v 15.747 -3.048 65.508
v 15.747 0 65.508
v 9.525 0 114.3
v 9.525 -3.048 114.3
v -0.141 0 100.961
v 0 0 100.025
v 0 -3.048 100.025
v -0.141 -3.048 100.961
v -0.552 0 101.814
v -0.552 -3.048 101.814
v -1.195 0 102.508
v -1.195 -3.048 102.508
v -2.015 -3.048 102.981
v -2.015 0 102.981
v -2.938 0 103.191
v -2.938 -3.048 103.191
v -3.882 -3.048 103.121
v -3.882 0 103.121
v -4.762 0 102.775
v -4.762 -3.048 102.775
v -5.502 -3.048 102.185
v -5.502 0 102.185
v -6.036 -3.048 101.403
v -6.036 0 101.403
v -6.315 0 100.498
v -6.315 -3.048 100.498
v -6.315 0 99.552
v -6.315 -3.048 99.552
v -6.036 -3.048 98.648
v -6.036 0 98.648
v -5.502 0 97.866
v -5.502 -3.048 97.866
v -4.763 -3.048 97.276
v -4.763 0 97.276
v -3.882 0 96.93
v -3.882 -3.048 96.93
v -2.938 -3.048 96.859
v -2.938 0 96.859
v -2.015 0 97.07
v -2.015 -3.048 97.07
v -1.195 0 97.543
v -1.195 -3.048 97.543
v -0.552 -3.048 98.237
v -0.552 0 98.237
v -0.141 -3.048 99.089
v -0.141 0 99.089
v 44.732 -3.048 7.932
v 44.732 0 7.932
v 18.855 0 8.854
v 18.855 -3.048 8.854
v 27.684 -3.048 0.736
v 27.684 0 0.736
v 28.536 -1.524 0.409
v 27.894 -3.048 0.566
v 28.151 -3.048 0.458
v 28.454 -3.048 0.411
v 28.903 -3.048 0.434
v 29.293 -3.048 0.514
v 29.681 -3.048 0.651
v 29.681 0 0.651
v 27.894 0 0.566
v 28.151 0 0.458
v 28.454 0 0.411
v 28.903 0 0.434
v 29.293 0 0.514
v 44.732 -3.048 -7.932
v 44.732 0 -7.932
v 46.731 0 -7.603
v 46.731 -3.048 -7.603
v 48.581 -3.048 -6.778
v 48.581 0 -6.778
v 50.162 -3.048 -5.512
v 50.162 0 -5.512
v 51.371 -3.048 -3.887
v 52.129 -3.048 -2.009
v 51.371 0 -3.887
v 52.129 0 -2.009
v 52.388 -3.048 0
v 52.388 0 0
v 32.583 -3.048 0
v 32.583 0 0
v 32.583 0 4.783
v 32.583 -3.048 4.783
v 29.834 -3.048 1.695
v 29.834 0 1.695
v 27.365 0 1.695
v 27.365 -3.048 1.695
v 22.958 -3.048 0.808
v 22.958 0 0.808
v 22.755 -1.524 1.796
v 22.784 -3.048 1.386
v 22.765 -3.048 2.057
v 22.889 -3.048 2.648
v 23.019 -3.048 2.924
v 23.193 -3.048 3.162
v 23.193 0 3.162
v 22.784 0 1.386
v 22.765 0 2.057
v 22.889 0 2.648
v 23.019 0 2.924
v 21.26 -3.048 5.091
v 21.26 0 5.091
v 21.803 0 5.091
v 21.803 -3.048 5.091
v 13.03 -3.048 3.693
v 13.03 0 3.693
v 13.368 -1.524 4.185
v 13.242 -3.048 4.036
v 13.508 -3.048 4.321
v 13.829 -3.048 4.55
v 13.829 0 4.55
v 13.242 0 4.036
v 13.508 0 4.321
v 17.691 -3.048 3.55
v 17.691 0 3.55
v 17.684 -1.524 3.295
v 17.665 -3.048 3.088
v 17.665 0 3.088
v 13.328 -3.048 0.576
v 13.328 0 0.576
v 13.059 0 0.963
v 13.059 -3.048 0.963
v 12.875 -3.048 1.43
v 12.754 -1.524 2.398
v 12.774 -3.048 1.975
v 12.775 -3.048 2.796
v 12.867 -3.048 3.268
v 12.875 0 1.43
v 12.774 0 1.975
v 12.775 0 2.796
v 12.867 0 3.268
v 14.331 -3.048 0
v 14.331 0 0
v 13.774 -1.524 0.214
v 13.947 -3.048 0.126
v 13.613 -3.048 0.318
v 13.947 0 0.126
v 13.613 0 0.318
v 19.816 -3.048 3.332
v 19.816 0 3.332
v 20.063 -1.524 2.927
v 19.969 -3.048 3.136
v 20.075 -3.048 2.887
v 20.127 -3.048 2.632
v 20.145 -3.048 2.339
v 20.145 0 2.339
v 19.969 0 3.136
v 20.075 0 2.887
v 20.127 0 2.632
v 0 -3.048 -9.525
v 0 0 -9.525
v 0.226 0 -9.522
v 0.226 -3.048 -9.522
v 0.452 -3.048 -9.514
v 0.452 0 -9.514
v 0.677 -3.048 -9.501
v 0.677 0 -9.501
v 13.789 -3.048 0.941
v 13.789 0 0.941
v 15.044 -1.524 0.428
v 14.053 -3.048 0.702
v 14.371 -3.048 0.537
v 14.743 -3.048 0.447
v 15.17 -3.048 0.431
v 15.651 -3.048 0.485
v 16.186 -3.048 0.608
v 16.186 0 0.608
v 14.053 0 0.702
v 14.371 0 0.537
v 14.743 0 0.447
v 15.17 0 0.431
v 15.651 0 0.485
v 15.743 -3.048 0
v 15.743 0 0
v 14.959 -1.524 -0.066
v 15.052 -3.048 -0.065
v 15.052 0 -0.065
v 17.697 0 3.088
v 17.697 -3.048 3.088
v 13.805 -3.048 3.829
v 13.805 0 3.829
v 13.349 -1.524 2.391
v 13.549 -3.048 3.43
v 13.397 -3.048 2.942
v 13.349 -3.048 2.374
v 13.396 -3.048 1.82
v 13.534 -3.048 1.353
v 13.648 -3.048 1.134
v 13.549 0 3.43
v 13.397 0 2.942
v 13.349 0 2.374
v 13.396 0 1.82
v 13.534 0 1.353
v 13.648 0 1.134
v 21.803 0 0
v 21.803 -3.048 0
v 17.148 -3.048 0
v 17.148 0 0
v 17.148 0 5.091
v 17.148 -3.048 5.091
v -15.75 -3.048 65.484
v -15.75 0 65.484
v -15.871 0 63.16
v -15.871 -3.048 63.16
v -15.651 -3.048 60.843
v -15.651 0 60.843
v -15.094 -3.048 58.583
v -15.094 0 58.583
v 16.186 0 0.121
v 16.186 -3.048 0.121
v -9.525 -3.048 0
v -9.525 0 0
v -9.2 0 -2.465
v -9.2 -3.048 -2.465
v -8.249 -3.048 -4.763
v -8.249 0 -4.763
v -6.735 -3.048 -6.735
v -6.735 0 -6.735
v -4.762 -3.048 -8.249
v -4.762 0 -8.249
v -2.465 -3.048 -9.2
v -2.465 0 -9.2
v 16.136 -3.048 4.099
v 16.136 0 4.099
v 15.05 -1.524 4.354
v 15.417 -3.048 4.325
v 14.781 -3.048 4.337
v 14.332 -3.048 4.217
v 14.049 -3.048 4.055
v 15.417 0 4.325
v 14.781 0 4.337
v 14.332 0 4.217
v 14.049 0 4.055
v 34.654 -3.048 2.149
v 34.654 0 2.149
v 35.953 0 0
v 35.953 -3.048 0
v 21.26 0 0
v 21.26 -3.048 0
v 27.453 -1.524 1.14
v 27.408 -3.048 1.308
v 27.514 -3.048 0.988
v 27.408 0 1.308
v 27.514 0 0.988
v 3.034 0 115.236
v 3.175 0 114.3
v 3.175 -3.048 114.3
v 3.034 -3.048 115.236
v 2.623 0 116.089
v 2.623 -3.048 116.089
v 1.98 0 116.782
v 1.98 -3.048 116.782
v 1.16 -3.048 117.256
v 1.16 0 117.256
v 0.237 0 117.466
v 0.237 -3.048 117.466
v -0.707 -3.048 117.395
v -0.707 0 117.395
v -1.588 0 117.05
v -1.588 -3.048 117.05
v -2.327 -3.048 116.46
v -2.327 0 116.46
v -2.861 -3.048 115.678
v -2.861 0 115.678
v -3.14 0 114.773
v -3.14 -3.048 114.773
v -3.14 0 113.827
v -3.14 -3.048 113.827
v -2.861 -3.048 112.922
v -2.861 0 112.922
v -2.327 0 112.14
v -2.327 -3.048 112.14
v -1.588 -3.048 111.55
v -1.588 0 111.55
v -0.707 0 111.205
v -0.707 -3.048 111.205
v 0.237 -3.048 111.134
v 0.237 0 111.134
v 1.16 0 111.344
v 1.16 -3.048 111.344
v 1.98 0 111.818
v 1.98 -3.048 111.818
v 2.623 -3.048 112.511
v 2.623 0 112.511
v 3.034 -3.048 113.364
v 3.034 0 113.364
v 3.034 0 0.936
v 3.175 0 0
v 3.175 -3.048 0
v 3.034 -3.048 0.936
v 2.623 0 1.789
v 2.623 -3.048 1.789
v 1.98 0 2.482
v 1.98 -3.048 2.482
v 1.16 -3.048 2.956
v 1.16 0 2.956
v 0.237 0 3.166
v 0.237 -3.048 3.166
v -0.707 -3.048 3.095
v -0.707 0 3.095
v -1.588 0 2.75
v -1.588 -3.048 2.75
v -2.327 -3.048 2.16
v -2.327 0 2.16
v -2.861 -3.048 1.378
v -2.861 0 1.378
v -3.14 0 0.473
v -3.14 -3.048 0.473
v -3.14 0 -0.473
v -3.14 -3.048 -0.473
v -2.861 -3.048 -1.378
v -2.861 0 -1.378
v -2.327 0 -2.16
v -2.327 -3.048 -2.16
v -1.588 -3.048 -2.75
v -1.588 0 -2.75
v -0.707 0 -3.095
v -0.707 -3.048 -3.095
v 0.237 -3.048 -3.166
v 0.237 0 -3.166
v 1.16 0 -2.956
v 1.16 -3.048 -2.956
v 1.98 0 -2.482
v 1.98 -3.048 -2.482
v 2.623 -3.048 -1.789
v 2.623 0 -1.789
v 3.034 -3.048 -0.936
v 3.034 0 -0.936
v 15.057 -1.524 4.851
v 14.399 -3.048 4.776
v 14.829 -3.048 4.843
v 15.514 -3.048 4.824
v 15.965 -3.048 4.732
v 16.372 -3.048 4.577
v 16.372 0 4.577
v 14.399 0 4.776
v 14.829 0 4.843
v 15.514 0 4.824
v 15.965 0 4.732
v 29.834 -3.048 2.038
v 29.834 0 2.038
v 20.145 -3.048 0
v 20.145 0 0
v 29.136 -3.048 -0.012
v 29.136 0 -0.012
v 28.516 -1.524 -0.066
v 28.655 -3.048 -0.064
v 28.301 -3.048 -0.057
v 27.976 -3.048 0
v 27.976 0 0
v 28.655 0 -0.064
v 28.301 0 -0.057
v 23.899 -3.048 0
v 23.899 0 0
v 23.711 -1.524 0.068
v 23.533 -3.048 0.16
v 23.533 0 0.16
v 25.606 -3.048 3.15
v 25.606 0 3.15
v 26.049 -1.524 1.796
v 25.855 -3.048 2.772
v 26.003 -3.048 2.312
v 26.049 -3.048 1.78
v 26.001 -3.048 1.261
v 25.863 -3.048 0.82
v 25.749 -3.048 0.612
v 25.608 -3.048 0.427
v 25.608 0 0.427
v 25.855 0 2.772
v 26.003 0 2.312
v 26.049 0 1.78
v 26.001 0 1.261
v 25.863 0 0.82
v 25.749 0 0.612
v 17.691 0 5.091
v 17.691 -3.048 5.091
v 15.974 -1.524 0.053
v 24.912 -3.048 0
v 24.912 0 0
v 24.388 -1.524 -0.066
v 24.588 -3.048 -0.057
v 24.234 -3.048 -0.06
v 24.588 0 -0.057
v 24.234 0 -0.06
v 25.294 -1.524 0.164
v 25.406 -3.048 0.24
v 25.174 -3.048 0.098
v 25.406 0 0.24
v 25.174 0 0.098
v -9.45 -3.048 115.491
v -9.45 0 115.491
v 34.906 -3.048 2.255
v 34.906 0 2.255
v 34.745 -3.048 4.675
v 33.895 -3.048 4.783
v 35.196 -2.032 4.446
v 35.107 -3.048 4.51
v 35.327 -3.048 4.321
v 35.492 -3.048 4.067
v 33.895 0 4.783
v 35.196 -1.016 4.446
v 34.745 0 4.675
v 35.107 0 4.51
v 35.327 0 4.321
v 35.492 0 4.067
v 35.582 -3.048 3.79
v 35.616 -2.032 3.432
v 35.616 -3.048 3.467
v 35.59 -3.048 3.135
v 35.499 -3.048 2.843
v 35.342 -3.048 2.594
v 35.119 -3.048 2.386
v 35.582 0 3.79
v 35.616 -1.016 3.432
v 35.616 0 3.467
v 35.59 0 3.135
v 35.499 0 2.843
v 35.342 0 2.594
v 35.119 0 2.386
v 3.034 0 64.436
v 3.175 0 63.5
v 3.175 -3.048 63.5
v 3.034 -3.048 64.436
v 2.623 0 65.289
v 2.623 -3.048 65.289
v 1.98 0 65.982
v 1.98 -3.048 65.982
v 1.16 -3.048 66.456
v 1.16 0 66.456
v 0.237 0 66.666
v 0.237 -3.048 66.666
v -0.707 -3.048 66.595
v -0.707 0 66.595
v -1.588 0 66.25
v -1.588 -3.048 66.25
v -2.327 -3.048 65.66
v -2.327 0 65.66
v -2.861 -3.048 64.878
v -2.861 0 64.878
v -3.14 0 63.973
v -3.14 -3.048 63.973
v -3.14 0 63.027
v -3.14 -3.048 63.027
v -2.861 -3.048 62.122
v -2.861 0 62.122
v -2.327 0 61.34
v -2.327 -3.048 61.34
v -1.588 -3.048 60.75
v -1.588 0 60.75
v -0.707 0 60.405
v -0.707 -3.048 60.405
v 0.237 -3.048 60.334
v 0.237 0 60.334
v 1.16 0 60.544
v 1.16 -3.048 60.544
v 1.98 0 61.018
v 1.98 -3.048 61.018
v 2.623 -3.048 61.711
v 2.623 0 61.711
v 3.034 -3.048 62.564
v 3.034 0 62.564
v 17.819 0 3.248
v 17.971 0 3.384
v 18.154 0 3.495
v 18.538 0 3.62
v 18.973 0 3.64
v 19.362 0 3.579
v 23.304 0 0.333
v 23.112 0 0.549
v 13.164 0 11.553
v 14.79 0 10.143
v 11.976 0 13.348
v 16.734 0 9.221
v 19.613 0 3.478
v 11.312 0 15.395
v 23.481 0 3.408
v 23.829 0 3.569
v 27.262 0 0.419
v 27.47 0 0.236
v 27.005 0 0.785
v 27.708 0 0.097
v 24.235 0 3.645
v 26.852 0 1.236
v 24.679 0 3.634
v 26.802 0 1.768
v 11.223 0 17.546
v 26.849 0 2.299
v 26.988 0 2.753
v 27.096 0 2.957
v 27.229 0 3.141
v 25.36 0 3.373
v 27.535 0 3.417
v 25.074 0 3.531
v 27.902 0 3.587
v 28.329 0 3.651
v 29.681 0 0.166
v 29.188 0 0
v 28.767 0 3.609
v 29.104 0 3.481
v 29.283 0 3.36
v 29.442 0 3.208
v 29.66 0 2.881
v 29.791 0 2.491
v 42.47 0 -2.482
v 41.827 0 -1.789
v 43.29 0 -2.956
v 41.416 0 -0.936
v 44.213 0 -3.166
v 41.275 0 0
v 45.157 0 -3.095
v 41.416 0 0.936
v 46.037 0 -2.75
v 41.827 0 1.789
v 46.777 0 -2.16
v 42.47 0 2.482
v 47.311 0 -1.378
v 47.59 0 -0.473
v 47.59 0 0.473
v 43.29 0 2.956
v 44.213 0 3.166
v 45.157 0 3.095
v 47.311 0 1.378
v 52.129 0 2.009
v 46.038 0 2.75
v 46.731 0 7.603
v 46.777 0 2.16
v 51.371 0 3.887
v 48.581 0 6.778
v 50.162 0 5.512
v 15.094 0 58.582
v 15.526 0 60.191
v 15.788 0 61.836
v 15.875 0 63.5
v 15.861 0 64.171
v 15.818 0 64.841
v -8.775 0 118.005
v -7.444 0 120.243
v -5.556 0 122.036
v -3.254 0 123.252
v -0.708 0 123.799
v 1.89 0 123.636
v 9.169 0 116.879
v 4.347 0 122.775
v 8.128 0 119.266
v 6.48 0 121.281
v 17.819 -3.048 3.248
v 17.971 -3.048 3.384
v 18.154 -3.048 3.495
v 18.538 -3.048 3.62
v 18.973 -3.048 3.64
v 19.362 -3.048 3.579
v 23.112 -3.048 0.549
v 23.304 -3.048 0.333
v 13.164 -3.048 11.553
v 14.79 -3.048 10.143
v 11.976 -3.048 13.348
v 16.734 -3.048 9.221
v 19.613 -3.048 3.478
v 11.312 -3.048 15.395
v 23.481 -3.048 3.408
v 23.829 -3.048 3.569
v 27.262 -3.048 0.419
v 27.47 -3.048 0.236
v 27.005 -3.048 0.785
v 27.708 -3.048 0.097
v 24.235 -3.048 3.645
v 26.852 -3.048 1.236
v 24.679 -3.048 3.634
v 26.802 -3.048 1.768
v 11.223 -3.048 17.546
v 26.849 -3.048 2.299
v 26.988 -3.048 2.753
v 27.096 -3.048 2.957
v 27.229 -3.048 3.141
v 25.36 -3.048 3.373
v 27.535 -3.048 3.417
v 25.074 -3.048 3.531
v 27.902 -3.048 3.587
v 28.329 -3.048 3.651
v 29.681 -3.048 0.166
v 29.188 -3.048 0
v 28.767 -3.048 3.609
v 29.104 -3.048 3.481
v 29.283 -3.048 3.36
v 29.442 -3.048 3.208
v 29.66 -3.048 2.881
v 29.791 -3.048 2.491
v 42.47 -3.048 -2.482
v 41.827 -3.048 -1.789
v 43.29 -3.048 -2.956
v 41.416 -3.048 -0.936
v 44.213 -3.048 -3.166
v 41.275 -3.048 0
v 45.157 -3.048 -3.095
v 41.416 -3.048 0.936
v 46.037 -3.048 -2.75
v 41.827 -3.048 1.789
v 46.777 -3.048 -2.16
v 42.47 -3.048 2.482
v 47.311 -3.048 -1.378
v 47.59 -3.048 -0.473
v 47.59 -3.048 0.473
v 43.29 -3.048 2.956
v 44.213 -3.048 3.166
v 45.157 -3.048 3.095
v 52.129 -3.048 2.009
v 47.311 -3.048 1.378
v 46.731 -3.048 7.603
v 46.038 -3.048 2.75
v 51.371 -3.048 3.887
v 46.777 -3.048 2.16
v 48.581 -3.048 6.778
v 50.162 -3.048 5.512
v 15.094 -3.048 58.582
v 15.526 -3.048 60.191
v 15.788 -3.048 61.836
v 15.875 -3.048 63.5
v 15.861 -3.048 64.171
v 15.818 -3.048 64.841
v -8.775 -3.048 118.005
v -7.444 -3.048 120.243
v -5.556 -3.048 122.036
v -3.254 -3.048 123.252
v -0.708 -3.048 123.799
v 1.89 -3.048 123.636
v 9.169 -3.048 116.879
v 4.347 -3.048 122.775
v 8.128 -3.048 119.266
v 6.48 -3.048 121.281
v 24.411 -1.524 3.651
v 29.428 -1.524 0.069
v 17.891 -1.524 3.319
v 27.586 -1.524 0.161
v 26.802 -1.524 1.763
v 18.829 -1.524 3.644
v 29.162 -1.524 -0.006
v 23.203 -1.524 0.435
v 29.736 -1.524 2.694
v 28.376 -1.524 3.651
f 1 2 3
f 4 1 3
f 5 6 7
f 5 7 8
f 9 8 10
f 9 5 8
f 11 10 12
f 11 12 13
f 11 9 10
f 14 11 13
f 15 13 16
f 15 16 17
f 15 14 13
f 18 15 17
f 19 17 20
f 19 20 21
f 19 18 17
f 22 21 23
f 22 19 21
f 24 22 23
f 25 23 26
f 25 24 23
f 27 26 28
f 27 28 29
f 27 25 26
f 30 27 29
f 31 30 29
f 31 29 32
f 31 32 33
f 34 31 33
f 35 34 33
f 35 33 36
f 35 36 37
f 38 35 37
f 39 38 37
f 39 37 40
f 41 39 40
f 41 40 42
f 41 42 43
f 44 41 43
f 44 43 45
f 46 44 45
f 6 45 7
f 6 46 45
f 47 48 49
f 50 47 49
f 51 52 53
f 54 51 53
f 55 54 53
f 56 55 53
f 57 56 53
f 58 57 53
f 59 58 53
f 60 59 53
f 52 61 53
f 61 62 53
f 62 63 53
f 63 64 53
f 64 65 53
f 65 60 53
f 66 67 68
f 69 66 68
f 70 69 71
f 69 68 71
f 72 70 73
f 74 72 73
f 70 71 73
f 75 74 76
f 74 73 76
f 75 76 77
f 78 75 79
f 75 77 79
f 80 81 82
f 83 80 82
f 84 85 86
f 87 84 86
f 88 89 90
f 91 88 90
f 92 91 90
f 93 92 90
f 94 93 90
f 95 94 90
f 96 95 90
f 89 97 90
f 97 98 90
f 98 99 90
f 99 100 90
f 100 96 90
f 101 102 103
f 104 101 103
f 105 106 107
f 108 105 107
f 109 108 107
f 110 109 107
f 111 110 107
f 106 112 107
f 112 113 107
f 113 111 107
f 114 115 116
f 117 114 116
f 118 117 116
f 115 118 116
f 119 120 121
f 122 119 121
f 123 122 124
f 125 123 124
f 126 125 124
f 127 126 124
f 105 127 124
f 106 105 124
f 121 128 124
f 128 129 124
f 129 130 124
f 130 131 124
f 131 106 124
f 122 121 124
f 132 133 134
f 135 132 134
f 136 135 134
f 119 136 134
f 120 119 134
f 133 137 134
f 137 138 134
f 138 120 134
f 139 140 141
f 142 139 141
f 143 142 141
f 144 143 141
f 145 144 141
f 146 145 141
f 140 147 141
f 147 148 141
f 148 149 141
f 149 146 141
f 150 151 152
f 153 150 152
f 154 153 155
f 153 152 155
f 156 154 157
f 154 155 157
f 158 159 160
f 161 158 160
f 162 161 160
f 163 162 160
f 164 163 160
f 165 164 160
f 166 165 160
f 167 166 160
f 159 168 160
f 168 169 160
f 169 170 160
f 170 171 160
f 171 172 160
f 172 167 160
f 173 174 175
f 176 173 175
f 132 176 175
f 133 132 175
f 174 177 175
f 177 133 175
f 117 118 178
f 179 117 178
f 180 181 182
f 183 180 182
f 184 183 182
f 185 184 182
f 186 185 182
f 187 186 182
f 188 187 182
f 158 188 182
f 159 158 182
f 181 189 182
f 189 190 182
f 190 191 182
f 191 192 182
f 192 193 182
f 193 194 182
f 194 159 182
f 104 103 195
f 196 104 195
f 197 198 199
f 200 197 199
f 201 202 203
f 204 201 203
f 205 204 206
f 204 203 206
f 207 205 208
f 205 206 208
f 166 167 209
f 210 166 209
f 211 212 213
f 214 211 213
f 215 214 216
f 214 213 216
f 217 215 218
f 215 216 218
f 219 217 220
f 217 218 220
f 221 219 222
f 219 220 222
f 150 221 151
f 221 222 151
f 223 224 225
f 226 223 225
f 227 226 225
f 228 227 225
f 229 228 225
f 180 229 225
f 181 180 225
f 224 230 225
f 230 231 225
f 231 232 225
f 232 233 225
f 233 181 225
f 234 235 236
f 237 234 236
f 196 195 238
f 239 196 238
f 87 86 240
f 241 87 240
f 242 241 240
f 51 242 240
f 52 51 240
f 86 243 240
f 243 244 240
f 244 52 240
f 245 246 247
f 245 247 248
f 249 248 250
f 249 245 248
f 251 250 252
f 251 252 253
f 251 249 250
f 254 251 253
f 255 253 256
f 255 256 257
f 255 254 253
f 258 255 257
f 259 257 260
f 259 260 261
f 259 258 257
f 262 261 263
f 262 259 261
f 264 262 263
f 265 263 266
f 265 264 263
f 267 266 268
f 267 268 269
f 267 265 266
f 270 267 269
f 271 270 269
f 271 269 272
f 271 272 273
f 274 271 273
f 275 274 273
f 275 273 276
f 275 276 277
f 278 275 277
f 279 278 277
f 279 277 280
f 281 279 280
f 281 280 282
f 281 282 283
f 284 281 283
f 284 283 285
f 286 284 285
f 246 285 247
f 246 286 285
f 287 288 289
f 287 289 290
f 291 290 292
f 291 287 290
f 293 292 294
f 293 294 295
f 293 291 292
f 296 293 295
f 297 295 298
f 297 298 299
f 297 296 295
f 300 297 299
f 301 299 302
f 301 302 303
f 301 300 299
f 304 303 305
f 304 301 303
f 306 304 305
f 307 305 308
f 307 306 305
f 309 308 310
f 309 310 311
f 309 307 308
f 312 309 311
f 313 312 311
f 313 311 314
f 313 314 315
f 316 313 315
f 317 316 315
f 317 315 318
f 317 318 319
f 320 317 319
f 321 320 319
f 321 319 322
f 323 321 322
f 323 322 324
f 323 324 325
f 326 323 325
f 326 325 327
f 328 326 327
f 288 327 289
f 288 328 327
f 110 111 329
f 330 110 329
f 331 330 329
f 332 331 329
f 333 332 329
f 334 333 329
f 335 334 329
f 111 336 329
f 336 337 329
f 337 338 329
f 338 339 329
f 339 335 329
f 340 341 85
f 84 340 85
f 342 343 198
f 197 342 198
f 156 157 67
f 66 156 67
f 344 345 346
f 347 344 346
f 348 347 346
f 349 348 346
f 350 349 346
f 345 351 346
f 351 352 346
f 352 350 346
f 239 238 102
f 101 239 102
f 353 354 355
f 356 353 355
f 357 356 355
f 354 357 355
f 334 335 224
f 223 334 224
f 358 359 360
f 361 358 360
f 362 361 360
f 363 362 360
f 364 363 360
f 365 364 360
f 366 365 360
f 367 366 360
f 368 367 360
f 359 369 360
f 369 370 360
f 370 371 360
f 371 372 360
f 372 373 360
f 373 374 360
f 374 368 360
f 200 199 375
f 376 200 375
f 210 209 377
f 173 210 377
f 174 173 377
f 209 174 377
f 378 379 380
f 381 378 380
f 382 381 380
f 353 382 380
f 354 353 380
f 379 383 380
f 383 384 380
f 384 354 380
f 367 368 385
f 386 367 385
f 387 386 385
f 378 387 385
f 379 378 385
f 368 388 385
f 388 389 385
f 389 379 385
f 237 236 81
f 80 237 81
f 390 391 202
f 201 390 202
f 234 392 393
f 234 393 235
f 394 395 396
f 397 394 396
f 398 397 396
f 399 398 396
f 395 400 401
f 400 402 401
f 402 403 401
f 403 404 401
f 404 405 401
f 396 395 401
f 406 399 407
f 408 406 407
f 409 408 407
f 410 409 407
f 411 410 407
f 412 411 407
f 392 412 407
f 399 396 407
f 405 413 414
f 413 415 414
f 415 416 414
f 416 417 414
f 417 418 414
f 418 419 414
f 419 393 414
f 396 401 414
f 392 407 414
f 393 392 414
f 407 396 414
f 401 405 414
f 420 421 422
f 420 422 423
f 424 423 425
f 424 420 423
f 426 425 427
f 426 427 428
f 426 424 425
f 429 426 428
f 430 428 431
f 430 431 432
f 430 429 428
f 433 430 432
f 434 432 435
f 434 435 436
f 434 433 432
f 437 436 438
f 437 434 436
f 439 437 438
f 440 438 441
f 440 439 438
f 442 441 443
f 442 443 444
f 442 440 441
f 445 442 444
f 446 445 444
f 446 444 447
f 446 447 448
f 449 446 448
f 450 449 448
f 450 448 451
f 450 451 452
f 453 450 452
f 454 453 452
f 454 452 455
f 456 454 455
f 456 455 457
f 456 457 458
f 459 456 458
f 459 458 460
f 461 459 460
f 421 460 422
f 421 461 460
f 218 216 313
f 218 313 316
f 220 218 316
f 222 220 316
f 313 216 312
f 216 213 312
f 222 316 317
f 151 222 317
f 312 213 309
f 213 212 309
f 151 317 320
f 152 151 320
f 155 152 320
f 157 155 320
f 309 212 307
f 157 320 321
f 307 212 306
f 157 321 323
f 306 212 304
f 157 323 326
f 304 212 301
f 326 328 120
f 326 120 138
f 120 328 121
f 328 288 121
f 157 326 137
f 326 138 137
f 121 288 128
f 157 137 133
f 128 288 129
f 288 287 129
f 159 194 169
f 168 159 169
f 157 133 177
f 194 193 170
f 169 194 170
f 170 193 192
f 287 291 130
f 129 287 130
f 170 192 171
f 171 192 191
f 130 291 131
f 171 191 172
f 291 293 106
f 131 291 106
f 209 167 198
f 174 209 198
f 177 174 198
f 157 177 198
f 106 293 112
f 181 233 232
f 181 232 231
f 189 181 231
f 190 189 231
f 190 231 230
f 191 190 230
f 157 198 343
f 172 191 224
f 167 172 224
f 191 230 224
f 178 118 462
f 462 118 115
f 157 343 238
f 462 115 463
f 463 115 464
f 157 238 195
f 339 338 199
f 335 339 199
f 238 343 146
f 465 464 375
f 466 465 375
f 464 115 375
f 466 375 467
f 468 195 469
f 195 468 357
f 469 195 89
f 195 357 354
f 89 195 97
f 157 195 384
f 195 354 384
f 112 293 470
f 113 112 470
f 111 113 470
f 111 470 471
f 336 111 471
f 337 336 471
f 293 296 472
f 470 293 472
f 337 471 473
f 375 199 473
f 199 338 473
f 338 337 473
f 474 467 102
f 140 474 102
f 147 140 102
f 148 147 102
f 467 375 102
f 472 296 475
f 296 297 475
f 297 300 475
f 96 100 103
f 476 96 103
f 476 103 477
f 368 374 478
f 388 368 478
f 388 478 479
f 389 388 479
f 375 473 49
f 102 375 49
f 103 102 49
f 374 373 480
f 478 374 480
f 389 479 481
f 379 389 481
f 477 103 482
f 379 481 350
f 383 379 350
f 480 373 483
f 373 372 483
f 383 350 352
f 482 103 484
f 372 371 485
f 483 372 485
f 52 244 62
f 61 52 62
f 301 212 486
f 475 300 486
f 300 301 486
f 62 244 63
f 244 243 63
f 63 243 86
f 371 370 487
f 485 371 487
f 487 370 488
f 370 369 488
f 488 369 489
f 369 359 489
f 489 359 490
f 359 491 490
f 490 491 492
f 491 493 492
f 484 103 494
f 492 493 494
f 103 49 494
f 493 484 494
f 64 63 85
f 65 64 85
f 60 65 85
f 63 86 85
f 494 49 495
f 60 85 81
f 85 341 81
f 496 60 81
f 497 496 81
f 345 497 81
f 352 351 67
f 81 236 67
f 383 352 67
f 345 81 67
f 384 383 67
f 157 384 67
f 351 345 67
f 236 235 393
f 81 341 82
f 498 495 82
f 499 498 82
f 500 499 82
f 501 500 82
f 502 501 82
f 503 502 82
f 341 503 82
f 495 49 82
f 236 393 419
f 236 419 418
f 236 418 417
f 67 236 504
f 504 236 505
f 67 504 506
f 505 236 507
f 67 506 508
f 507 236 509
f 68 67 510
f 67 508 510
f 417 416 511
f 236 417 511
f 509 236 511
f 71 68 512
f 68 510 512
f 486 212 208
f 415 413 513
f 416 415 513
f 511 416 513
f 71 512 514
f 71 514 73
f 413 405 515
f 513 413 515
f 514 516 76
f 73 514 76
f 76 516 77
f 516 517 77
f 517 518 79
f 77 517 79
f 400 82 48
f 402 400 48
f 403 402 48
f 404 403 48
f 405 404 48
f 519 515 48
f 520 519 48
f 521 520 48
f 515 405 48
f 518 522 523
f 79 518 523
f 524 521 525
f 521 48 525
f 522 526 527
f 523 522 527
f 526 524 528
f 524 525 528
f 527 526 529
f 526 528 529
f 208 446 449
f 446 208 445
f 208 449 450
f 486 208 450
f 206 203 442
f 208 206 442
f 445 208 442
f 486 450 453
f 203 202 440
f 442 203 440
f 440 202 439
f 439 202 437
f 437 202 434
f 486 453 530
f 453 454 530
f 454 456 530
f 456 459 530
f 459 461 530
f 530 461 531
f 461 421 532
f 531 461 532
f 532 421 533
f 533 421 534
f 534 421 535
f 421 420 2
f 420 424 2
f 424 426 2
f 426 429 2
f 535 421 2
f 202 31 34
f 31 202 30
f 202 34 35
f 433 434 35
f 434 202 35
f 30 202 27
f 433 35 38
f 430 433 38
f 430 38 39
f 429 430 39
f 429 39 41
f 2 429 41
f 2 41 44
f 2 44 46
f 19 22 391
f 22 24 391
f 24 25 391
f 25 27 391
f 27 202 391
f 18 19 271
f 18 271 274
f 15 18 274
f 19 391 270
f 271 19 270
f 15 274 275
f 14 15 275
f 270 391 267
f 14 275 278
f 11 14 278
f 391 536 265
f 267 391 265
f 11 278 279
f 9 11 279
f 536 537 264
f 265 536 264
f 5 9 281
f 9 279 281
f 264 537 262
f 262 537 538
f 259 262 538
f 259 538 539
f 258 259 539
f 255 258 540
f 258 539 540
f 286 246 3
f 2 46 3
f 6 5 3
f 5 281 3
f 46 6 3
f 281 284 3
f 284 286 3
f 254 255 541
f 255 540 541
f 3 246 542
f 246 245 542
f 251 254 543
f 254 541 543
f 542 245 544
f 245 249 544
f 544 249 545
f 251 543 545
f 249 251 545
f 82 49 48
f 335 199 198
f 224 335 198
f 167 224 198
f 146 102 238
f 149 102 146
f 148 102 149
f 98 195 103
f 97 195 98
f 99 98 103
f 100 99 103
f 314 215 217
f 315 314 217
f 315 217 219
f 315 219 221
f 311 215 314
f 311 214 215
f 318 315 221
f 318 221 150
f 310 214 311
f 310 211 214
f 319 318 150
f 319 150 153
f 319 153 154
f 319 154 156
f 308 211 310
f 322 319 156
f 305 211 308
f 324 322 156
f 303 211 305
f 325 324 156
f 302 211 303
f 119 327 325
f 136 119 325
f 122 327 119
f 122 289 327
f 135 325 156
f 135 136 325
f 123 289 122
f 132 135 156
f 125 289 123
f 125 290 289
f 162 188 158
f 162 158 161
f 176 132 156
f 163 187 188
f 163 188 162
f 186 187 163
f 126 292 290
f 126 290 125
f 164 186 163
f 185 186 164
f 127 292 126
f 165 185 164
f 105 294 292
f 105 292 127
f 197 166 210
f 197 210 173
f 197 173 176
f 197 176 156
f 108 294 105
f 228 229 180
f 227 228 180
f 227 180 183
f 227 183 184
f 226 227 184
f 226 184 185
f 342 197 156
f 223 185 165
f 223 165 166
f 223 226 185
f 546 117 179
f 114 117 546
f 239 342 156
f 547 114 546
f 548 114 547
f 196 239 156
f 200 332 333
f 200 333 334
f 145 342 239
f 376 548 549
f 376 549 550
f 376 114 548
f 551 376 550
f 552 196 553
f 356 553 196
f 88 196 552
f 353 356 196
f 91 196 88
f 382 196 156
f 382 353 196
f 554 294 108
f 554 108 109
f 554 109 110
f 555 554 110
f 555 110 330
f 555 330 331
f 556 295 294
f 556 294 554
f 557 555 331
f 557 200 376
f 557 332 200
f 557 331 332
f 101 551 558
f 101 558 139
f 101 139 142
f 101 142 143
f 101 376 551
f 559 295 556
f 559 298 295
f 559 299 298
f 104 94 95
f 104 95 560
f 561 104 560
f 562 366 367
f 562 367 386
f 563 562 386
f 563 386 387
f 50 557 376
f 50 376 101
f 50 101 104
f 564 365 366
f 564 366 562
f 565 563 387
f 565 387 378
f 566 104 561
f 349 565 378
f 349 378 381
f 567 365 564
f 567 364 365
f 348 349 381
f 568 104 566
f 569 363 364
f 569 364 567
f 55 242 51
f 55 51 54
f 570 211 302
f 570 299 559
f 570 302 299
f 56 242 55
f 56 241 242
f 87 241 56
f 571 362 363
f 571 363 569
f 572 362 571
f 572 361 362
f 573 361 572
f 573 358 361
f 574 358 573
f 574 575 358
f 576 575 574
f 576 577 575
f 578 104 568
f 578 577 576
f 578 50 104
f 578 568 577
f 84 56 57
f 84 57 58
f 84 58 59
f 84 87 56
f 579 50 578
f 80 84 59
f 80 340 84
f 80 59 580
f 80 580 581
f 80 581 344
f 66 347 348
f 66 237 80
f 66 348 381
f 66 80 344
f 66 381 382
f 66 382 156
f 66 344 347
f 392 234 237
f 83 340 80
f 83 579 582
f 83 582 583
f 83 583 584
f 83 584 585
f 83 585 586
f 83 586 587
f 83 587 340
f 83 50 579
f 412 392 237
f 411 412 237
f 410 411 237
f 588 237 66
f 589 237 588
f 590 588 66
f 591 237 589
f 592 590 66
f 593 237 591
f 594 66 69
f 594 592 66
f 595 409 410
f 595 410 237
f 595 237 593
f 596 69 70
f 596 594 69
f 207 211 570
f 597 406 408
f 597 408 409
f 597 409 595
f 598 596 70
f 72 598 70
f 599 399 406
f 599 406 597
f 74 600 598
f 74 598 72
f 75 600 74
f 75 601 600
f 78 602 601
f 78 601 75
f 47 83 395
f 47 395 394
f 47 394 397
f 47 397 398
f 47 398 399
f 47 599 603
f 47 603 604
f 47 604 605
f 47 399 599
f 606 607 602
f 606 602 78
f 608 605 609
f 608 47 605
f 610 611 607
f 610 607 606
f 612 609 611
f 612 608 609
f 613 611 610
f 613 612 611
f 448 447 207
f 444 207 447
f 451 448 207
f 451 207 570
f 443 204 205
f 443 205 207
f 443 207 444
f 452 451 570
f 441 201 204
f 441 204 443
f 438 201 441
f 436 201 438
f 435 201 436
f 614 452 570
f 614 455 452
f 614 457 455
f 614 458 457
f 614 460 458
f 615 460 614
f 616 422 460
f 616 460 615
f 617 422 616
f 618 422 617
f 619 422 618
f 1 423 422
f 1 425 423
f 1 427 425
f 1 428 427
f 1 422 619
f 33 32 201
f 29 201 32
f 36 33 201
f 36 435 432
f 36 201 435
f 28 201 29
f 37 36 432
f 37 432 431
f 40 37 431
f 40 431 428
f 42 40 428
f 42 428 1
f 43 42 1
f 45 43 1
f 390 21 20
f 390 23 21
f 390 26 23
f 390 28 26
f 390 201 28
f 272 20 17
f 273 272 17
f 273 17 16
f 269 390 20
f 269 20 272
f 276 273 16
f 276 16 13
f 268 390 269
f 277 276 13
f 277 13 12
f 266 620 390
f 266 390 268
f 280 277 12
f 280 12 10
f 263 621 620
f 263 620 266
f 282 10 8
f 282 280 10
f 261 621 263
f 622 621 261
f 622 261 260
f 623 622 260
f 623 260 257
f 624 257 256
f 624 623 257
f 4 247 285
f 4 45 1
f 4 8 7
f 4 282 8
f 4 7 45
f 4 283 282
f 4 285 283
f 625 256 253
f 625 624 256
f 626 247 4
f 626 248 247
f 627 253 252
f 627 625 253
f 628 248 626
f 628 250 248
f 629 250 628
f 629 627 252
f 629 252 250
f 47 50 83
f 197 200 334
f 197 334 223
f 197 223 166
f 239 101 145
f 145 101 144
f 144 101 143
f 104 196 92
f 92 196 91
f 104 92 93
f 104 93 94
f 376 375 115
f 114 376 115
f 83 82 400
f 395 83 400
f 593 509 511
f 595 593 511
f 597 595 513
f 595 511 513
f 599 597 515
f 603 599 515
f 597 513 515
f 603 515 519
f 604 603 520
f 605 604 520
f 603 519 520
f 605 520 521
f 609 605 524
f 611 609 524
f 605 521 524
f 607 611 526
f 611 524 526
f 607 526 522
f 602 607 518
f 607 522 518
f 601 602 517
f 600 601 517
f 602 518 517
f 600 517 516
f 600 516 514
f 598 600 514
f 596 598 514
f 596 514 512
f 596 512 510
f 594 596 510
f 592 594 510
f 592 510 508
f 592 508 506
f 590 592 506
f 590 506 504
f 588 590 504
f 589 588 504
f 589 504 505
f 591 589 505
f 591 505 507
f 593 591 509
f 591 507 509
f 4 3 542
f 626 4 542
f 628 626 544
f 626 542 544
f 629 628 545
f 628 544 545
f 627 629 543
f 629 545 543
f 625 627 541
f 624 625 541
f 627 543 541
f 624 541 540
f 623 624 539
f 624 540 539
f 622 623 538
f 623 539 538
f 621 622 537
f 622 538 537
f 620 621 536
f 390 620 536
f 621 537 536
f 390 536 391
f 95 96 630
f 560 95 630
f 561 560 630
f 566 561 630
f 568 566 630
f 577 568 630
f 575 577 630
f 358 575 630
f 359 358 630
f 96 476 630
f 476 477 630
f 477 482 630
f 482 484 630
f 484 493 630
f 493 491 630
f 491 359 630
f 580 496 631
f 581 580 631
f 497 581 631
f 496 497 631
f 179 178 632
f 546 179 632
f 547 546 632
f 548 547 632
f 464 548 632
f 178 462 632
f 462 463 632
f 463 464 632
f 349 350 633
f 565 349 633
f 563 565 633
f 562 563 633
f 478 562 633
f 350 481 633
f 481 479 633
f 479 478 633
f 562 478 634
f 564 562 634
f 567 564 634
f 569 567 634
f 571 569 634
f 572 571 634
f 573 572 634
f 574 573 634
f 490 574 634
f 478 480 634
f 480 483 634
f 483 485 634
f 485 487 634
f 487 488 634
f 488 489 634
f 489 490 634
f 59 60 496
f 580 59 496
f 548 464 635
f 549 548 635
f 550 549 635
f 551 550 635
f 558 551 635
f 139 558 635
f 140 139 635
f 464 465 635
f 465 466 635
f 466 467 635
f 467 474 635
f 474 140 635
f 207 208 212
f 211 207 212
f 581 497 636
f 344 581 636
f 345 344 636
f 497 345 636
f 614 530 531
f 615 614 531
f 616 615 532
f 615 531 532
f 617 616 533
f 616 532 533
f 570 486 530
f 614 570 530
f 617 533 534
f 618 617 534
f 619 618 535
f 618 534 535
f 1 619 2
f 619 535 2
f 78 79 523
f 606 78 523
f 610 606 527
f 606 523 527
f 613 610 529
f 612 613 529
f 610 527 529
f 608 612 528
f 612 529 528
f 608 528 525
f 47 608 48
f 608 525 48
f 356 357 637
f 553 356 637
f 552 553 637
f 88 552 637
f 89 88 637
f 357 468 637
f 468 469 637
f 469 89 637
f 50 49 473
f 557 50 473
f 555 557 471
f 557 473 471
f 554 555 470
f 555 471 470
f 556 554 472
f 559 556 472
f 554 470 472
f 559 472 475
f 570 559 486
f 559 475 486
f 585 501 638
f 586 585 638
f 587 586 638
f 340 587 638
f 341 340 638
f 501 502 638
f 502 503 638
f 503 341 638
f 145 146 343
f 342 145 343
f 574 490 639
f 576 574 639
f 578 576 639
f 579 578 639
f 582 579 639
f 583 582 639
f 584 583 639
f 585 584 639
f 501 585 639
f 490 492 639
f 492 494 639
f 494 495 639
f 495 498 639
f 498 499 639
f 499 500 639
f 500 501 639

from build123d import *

# Parameters (mm, degrees)
F0_R     = 3.175
F1_DEPTH = 3.048


with BuildPart() as f1:
    # F0 (on Front) → F1 (new body)
    with BuildSketch(Plane.XZ):
        with BuildLine():
            ThreePointArc((0.6773435479, -9.500885786), (6.9705567315, -6.4912990883), (9.525, 0))
            ThreePointArc((9.525, 0), (0, 9.525), (-9.525, 0))
            ThreePointArc((-9.525, 0), (-6.7351920908, -6.7351920908), (0, -9.525))
            Line((0, -9.525), (0.6773435479, -9.500885786))
        make_face()
        Circle(F0_R, mode=Mode.SUBTRACT)
        with BuildLine():
            ThreePointArc((-9.525, 0), (0, 9.525), (9.525, 0))
            Line((9.525, 0), (14.331017163, 0))
            add(Edge.make_bspline(
                [(14.331017163, 0), (13.7183681716, 0.1397724716), (13.3282485764, 0.5757675707)],
                knots=[0.3205826669, 0.3205826669, 0.3205826669, 1, 1, 1], degree=2))
            add(Edge.make_bspline(
                [(13.3282485764, 0.5757675707), (12.7540512809, 1.2174866995), (12.7540512809, 2.3983336445)],
                knots=[0, 0, 0, 1, 1, 1], degree=2))
            add(Edge.make_bspline(
                [(12.7540512809, 2.3983336445), (12.7540512809, 3.1374098353), (13.0304197148, 3.6932872536)],
                knots=[0, 0, 0, 1, 1, 1], degree=2))
            add(Edge.make_bspline(
                [(13.0304197148, 3.6932872536), (13.3067881487, 4.2491646718), (13.8286429378, 4.5501340838)],
                knots=[0, 0, 0, 1, 1, 1], degree=2))
            add(Edge.make_bspline(
                [(13.8286429378, 4.5501340838), (14.3504977269, 4.8511034957), (15.0571215637, 4.8511034957)],
                knots=[0, 0, 0, 1, 1, 1], degree=2))
            add(Edge.make_bspline(
                [(15.0571215637, 4.8511034957), (15.808759956, 4.8511034957), (16.3719653252, 4.5768287621)],
                knots=[0, 0, 0, 1, 1, 1], degree=2))
            Line((16.3719653252, 4.5768287621), (16.1364240462, 4.0994651034))
            add(Edge.make_bspline(
                [(16.1364240462, 4.0994651034), (15.5931088295, 4.3538496847), (15.0497936128, 4.3538496847)],
                knots=[0, 0, 0, 1, 1, 1], degree=2))
            add(Edge.make_bspline(
                [(15.0497936128, 4.3538496847), (14.261515466, 4.3538496847), (13.8050888099, 3.8288543452)],
                knots=[0, 0, 0, 1, 1, 1], degree=2))
            add(Edge.make_bspline(
                [(13.8050888099, 3.8288543452), (13.3486621539, 3.3038590057), (13.3486621539, 2.3910056936)],
                knots=[0, 0, 0, 1, 1, 1], degree=2))
            add(Edge.make_bspline(
                [(13.3486621539, 2.3910056936), (13.3486621539, 1.4530279784), (13.7888626329, 0.9405948405)],
                knots=[0, 0, 0, 1, 1, 1], degree=2))
            add(Edge.make_bspline(
                [(13.7888626329, 0.9405948405), (14.229063112, 0.4281617026), (15.043512512, 0.4281617026)],
                knots=[0, 0, 0, 1, 1, 1], degree=2))
            add(Edge.make_bspline(
                [(15.043512512, 0.4281617026), (15.5439068735, 0.4281617026), (16.1856260023, 0.6082199247)],
                knots=[0, 0, 0, 1, 1, 1], degree=2))
            Line((16.1856260023, 0.6082199247), (16.1856260023, 0.1214346149))
            add(Edge.make_bspline(
                [(16.1856260023, 0.1214346149), (15.9833720986, 0.045216828), (15.7426700783, 0)],
                knots=[0, 0, 0, 0.406741787, 0.406741787, 0.406741787], degree=2))
            Line((15.7426700783, 0), (17.1476812704, 0))
            Line((17.1476812704, 0), (17.1476812704, 5.0908321752))
            Line((17.1476812704, 5.0908321752), (17.6909964871, 5.0908321752))
            Line((17.6909964871, 5.0908321752), (17.6909964871, 3.5498687859))
            add(Edge.make_bspline(
                [(17.6909964871, 3.5498687859), (17.6909964871, 3.2714066517), (17.6648252339, 3.0882078792)],
                knots=[0, 0, 0, 1, 1, 1], degree=2))
            Line((17.6648252339, 3.0882078792), (17.6972775879, 3.0882078792))
            add(Edge.make_bspline(
                [(17.6972775879, 3.0882078792), (17.8574456576, 3.346779861), (18.153704244, 3.4954325793)],
                knots=[0, 0, 0, 1, 1, 1], degree=2))
            add(Edge.make_bspline(
                [(18.153704244, 3.4954325793), (18.4499628303, 3.6440852975), (18.8289225769, 3.6440852975)],
                knots=[0, 0, 0, 1, 1, 1], degree=2))
            add(Edge.make_bspline(
                [(18.8289225769, 3.6440852975), (19.4863444576, 3.6440852975), (19.8155788231, 3.3316005341)],
                knots=[0, 0, 0, 1, 1, 1], degree=2))
            add(Edge.make_bspline(
                [(19.8155788231, 3.3316005341), (20.1448131885, 3.0191157708), (20.1448131885, 2.3386631872)],
                knots=[0, 0, 0, 1, 1, 1], degree=2))
            Line((20.1448131885, 2.3386631872), (20.1448131885, 0))
            Line((20.1448131885, 0), (21.2597085754, 0))
            Line((21.2597085754, 0), (21.2597085754, 5.0908321752))
            Line((21.2597085754, 5.0908321752), (21.8030237921, 5.0908321752))
            Line((21.8030237921, 5.0908321752), (21.8030237921, 0))
            Line((21.8030237921, 0), (23.8993166222, 0))
            add(Edge.make_bspline(
                [(23.8993166222, 0), (23.7048762281, 0.0561669981), (23.5334670546, 0.1601680697)],
                knots=[0.5400617249, 0.5400617249, 0.5400617249, 1, 1, 1], degree=2))
            add(Edge.make_bspline(
                [(23.5334670546, 0.1601680697), (23.1607884089, 0.3862876974), (22.9576994839, 0.8081682992)],
                knots=[0, 0, 0, 1, 1, 1], degree=2))
            add(Edge.make_bspline(
                [(22.9576994839, 0.8081682992), (22.754610559, 1.2300489011), (22.754610559, 1.7963948206)],
                knots=[0, 0, 0, 1, 1, 1], degree=2))
            add(Edge.make_bspline(
                [(22.754610559, 1.7963948206), (22.754610559, 2.6726083782), (23.1932407628, 3.1620108133)],
                knots=[0, 0, 0, 1, 1, 1], degree=2))
            add(Edge.make_bspline(
                [(23.1932407628, 3.1620108133), (23.6318709667, 3.6514132484), (24.4107274624, 3.6514132484)],
                knots=[0, 0, 0, 1, 1, 1], degree=2))
            add(Edge.make_bspline(
                [(24.4107274624, 3.6514132484), (25.1623658547, 3.6514132484), (25.6057068841, 3.1504954619)],
                knots=[0, 0, 0, 1, 1, 1], degree=2))
            add(Edge.make_bspline(
                [(25.6057068841, 3.1504954619), (26.0490479136, 2.6495776754), (26.0490479136, 1.7963948206)],
                knots=[0, 0, 0, 1, 1, 1], degree=2))
            add(Edge.make_bspline(
                [(26.0490479136, 1.7963948206), (26.0490479136, 0.9191344129), (25.6078005844, 0.4265914274)],
                knots=[0, 0, 0, 1, 1, 1], degree=2))
            add(Edge.make_bspline(
                [(25.6078005844, 0.4265914274), (25.3280160816, 0.1142815613), (24.9124948555, 0)],
                knots=[0, 0, 0, 0.6340763655, 0.6340763655, 0.6340763655], degree=2))
            Line((24.9124948555, 0), (27.9757976787, 0))
            add(Edge.make_bspline(
                [(27.9757976787, 0), (27.5521982697, 0.1128392886), (27.2618237875, 0.4187400514)],
                knots=[0.3688754729, 0.3688754729, 0.3688754729, 1, 1, 1], degree=2))
            add(Edge.make_bspline(
                [(27.2618237875, 0.4187400514), (26.801733156, 0.9034316609), (26.801733156, 1.7628956165)],
                knots=[0, 0, 0, 1, 1, 1], degree=2))
            add(Edge.make_bspline(
                [(26.801733156, 1.7628956165), (26.801733156, 2.6307343731), (27.2288480084, 3.1410738107)],
                knots=[0, 0, 0, 1, 1, 1], degree=2))
            add(Edge.make_bspline(
                [(27.2288480084, 3.1410738107), (27.6559628609, 3.6514132484), (28.3761957493, 3.6514132484)],
                knots=[0, 0, 0, 1, 1, 1], degree=2))
            add(Edge.make_bspline(
                [(28.3761957493, 3.6514132484), (29.049320382, 3.6514132484), (29.4418891802, 3.208072219)],
                knots=[0, 0, 0, 1, 1, 1], degree=2))
            add(Edge.make_bspline(
                [(29.4418891802, 3.208072219), (29.8344579784, 2.7647311895), (29.8344579784, 2.0382172003)],
                knots=[0, 0, 0, 1, 1, 1], degree=2))
            Line((29.8344579784, 2.0382172003), (29.8344579784, 1.6948503581))
            Line((29.8344579784, 1.6948503581), (27.3649385251, 1.6948503581))
            add(Edge.make_bspline(
                [(27.3649385251, 1.6948503581), (27.3816881272, 1.0635997306), (27.6842278144, 0.7364590654)],
                knots=[0, 0, 0, 1, 1, 1], degree=2))
            add(Edge.make_bspline(
                [(27.6842278144, 0.7364590654), (27.9867675015, 0.4093184003), (28.536363819, 0.4093184003)],
                knots=[0, 0, 0, 1, 1, 1], degree=2))
            add(Edge.make_bspline(
                [(28.536363819, 0.4093184003), (29.1152719401, 0.4093184003), (29.6805710095, 0.65114078)],
                knots=[0, 0, 0, 1, 1, 1], degree=2))
            Line((29.6805710095, 0.65114078), (29.6805710095, 0.1664491704))
            add(Edge.make_bspline(
                [(29.6805710095, 0.1664491704), (29.4213281794, 0.0552104288), (29.1875527642, 0)],
                knots=[0, 0, 0, 0.9005120931, 0.9005120931, 0.9005120931], degree=2))
            Line((29.1875527642, 0), (32.583486416, 0))
            Line((32.583486416, 0), (32.583486416, 4.7830582374))
            Line((32.583486416, 4.7830582374), (33.8951896271, 4.7830582374))
            add(Edge.make_bspline(
                [(33.8951896271, 4.7830582374), (34.7755905852, 4.7830582374), (35.1959009118, 4.445972496)],
                knots=[0, 0, 0, 1, 1, 1], degree=2))
            add(Edge.make_bspline(
                [(35.1959009118, 4.445972496), (35.6162112384, 4.1088867546), (35.6162112384, 3.4315747214)],
                knots=[0, 0, 0, 1, 1, 1], degree=2))
            add(Edge.make_bspline(
                [(35.6162112384, 3.4315747214), (35.6162112384, 2.4831285049), (34.6541559703, 2.1491833139)],
                knots=[0, 0, 0, 1, 1, 1], degree=2))
            Line((34.6541559703, 2.1491833139), (35.9532969798, 0))
            Line((35.9532969798, 0), (36.5125, 0))
            ThreePointArc((36.5125, 0), (38.9380895153, 5.7116327839), (44.7324052746, 7.9324746146))
            Line((44.7324052746, 7.9324746146), (18.854776384, 8.8537481448))
            ThreePointArc((18.854776384, 8.8537481448), (13.1636347791, 11.5532480081), (11.2225788762, 17.545634366))
            Line((11.2225788762, 17.545634366), (15.0940259351, 58.5820729906))
            ThreePointArc((15.0940259351, 58.5820729906), (-0.0006204693, 47.6250000121), (-15.0944103202, 58.583252896))
            Line((-15.0944103202, 58.583252896), (-9.525, 0))
        make_face()
        with BuildLine():
            Line((14.331017163, 0), (9.525, 0))
            ThreePointArc((9.525, 0), (6.9705567315, -6.4912990883), (0.6773435479, -9.500885786))
            Line((0.6773435479, -9.500885786), (44.7324052746, -7.9324746146))
            ThreePointArc((44.7324052746, -7.9324746146), (38.9380895153, -5.7116327839), (36.5125, 0))
            Line((36.5125, 0), (35.9532969798, 0))
            Line((35.9532969798, 0), (35.2958750991, 0))
            Line((35.2958750991, 0), (33.1393638343, 0))
            Line((33.1393638343, 0), (32.583486416, 0))
            Line((32.583486416, 0), (29.1875527642, 0))
            add(Edge.make_bspline(
                [(29.1875527642, 0), (29.1617254301, -0.0060996071), (29.1362089427, -0.0115153514)],
                knots=[0.9005120931, 0.9005120931, 0.9005120931, 1, 1, 1], degree=2))
            add(Edge.make_bspline(
                [(29.1362089427, -0.0115153514), (28.8797306612, -0.0659515581), (28.5164736666, -0.0659515581)],
                knots=[0, 0, 0, 1, 1, 1], degree=2))
            add(Edge.make_bspline(
                [(28.5164736666, -0.0659515581), (28.2233802484, -0.0659515581), (27.9757976787, 0)],
                knots=[0, 0, 0, 0.3688754729, 0.3688754729, 0.3688754729], degree=2))
            Line((27.9757976787, 0), (24.9124948555, 0))
            add(Edge.make_bspline(
                [(24.9124948555, 0), (24.6726987592, -0.0659515581), (24.3876967595, -0.0659515581)],
                knots=[0.6340763655, 0.6340763655, 0.6340763655, 1, 1, 1], degree=2))
            add(Edge.make_bspline(
                [(24.3876967595, -0.0659515581), (24.1276294639, -0.0659515581), (23.8993166222, 0)],
                knots=[0, 0, 0, 0.5400617249, 0.5400617249, 0.5400617249], degree=2))
            Line((23.8993166222, 0), (21.8030237921, 0))
            Line((21.8030237921, 0), (21.2597085754, 0))
            Line((21.2597085754, 0), (20.1448131885, 0))
            Line((20.1448131885, 0), (19.6014979718, 0))
            Line((19.6014979718, 0), (17.6909964871, 0))
            Line((17.6909964871, 0), (17.1476812704, 0))
            Line((17.1476812704, 0), (15.7426700783, 0))
            add(Edge.make_bspline(
                [(15.7426700783, 0), (15.3915911999, -0.0659515581), (14.9587176516, -0.0659515581)],
                knots=[0.406741787, 0.406741787, 0.406741787, 1, 1, 1], degree=2))
            add(Edge.make_bspline(
                [(14.9587176516, -0.0659515581), (14.6200952275, -0.0659515581), (14.331017163, 0)],
                knots=[0, 0, 0, 0.3205826669, 0.3205826669, 0.3205826669], degree=2))
        make_face()
        with BuildLine():
            ThreePointArc((0, -9.525), (0.3388863295, -9.5189695375), (0.6773435479, -9.500885786))
            Line((0.6773435479, -9.500885786), (0, -9.525))
        make_face()
        with BuildLine():
            Line((-15.7504882737, 65.484375), (-15.0944103202, 58.583252896))
            ThreePointArc((-15.0944103202, 58.583252896), (-0.0006204693, 47.6250000121), (15.0940259351, 58.5820729906))
            Line((15.0940259351, 58.5820729906), (15.7474569047, 65.5082893304))
            ThreePointArc((15.7474569047, 65.5082893304), (-0.0120528461, 79.3749954245), (-15.7504882737, 65.484375))
        make_face()
        with Locations((0, 63.5)):
            Circle(F0_R, mode=Mode.SUBTRACT)
        with BuildLine():
            ThreePointArc((-15.7504882737, 65.484375), (-15.8037436669, 61.9975649401), (-15.0944103202, 58.583252896))
            Line((-15.0944103202, 58.583252896), (-15.7504882737, 65.484375))
        make_face()
        with BuildLine():
            ThreePointArc((36.5125, 0), (38.9380895153, -5.7116327839), (44.7324052746, -7.9324746146))
            ThreePointArc((44.7324052746, -7.9324746146), (50.1616327839, -5.5119104847), (52.3875, 0))
            ThreePointArc((52.3875, 0), (50.1616327839, 5.5119104847), (44.7324052746, 7.9324746146))
            ThreePointArc((44.7324052746, 7.9324746146), (38.9380895153, 5.7116327839), (36.5125, 0))
        make_face()
        with BuildLine():
            ThreePointArc((47.625, 0), (44.45, -3.175), (41.275, 0))
            ThreePointArc((41.275, 0), (44.45, 3.175), (47.625, 0))
        make_face(mode=Mode.SUBTRACT)
        with BuildLine():
            Line((-9.4502929642, 115.490625), (-15.7504882737, 65.484375))
            ThreePointArc((-15.7504882737, 65.484375), (-0.0120528461, 79.3749954245), (15.7474569047, 65.5082893304))
            Line((15.7474569047, 65.5082893304), (9.525, 114.3))
            ThreePointArc((9.525, 114.3), (-0.596483242, 104.7936951058), (-9.4502929642, 115.490625))
        make_face()
        with Locations((-3.175, 100.0252)):
            Circle(F0_R, mode=Mode.SUBTRACT)
        with BuildLine():
            Line((15.7474569047, 65.5082893304), (15.0940259351, 58.5820729906))
            ThreePointArc((15.0940259351, 58.5820729906), (15.6785408556, 61.0102245804), (15.875, 63.5))
            ThreePointArc((15.875, 63.5), (15.8430821396, 64.5061676396), (15.7474569047, 65.5082893304))
        make_face()
        with BuildLine():
            ThreePointArc((9.525, 114.3), (0.596483242, 123.8063048942), (-9.4502929642, 115.490625))
            ThreePointArc((-9.4502929642, 115.490625), (-0.596483242, 104.7936951058), (9.525, 114.3))
        make_face()
        with Locations((0, 114.3)):
            Circle(F0_R, mode=Mode.SUBTRACT)
    extrude(amount=F1_DEPTH)


solid = f1.part
